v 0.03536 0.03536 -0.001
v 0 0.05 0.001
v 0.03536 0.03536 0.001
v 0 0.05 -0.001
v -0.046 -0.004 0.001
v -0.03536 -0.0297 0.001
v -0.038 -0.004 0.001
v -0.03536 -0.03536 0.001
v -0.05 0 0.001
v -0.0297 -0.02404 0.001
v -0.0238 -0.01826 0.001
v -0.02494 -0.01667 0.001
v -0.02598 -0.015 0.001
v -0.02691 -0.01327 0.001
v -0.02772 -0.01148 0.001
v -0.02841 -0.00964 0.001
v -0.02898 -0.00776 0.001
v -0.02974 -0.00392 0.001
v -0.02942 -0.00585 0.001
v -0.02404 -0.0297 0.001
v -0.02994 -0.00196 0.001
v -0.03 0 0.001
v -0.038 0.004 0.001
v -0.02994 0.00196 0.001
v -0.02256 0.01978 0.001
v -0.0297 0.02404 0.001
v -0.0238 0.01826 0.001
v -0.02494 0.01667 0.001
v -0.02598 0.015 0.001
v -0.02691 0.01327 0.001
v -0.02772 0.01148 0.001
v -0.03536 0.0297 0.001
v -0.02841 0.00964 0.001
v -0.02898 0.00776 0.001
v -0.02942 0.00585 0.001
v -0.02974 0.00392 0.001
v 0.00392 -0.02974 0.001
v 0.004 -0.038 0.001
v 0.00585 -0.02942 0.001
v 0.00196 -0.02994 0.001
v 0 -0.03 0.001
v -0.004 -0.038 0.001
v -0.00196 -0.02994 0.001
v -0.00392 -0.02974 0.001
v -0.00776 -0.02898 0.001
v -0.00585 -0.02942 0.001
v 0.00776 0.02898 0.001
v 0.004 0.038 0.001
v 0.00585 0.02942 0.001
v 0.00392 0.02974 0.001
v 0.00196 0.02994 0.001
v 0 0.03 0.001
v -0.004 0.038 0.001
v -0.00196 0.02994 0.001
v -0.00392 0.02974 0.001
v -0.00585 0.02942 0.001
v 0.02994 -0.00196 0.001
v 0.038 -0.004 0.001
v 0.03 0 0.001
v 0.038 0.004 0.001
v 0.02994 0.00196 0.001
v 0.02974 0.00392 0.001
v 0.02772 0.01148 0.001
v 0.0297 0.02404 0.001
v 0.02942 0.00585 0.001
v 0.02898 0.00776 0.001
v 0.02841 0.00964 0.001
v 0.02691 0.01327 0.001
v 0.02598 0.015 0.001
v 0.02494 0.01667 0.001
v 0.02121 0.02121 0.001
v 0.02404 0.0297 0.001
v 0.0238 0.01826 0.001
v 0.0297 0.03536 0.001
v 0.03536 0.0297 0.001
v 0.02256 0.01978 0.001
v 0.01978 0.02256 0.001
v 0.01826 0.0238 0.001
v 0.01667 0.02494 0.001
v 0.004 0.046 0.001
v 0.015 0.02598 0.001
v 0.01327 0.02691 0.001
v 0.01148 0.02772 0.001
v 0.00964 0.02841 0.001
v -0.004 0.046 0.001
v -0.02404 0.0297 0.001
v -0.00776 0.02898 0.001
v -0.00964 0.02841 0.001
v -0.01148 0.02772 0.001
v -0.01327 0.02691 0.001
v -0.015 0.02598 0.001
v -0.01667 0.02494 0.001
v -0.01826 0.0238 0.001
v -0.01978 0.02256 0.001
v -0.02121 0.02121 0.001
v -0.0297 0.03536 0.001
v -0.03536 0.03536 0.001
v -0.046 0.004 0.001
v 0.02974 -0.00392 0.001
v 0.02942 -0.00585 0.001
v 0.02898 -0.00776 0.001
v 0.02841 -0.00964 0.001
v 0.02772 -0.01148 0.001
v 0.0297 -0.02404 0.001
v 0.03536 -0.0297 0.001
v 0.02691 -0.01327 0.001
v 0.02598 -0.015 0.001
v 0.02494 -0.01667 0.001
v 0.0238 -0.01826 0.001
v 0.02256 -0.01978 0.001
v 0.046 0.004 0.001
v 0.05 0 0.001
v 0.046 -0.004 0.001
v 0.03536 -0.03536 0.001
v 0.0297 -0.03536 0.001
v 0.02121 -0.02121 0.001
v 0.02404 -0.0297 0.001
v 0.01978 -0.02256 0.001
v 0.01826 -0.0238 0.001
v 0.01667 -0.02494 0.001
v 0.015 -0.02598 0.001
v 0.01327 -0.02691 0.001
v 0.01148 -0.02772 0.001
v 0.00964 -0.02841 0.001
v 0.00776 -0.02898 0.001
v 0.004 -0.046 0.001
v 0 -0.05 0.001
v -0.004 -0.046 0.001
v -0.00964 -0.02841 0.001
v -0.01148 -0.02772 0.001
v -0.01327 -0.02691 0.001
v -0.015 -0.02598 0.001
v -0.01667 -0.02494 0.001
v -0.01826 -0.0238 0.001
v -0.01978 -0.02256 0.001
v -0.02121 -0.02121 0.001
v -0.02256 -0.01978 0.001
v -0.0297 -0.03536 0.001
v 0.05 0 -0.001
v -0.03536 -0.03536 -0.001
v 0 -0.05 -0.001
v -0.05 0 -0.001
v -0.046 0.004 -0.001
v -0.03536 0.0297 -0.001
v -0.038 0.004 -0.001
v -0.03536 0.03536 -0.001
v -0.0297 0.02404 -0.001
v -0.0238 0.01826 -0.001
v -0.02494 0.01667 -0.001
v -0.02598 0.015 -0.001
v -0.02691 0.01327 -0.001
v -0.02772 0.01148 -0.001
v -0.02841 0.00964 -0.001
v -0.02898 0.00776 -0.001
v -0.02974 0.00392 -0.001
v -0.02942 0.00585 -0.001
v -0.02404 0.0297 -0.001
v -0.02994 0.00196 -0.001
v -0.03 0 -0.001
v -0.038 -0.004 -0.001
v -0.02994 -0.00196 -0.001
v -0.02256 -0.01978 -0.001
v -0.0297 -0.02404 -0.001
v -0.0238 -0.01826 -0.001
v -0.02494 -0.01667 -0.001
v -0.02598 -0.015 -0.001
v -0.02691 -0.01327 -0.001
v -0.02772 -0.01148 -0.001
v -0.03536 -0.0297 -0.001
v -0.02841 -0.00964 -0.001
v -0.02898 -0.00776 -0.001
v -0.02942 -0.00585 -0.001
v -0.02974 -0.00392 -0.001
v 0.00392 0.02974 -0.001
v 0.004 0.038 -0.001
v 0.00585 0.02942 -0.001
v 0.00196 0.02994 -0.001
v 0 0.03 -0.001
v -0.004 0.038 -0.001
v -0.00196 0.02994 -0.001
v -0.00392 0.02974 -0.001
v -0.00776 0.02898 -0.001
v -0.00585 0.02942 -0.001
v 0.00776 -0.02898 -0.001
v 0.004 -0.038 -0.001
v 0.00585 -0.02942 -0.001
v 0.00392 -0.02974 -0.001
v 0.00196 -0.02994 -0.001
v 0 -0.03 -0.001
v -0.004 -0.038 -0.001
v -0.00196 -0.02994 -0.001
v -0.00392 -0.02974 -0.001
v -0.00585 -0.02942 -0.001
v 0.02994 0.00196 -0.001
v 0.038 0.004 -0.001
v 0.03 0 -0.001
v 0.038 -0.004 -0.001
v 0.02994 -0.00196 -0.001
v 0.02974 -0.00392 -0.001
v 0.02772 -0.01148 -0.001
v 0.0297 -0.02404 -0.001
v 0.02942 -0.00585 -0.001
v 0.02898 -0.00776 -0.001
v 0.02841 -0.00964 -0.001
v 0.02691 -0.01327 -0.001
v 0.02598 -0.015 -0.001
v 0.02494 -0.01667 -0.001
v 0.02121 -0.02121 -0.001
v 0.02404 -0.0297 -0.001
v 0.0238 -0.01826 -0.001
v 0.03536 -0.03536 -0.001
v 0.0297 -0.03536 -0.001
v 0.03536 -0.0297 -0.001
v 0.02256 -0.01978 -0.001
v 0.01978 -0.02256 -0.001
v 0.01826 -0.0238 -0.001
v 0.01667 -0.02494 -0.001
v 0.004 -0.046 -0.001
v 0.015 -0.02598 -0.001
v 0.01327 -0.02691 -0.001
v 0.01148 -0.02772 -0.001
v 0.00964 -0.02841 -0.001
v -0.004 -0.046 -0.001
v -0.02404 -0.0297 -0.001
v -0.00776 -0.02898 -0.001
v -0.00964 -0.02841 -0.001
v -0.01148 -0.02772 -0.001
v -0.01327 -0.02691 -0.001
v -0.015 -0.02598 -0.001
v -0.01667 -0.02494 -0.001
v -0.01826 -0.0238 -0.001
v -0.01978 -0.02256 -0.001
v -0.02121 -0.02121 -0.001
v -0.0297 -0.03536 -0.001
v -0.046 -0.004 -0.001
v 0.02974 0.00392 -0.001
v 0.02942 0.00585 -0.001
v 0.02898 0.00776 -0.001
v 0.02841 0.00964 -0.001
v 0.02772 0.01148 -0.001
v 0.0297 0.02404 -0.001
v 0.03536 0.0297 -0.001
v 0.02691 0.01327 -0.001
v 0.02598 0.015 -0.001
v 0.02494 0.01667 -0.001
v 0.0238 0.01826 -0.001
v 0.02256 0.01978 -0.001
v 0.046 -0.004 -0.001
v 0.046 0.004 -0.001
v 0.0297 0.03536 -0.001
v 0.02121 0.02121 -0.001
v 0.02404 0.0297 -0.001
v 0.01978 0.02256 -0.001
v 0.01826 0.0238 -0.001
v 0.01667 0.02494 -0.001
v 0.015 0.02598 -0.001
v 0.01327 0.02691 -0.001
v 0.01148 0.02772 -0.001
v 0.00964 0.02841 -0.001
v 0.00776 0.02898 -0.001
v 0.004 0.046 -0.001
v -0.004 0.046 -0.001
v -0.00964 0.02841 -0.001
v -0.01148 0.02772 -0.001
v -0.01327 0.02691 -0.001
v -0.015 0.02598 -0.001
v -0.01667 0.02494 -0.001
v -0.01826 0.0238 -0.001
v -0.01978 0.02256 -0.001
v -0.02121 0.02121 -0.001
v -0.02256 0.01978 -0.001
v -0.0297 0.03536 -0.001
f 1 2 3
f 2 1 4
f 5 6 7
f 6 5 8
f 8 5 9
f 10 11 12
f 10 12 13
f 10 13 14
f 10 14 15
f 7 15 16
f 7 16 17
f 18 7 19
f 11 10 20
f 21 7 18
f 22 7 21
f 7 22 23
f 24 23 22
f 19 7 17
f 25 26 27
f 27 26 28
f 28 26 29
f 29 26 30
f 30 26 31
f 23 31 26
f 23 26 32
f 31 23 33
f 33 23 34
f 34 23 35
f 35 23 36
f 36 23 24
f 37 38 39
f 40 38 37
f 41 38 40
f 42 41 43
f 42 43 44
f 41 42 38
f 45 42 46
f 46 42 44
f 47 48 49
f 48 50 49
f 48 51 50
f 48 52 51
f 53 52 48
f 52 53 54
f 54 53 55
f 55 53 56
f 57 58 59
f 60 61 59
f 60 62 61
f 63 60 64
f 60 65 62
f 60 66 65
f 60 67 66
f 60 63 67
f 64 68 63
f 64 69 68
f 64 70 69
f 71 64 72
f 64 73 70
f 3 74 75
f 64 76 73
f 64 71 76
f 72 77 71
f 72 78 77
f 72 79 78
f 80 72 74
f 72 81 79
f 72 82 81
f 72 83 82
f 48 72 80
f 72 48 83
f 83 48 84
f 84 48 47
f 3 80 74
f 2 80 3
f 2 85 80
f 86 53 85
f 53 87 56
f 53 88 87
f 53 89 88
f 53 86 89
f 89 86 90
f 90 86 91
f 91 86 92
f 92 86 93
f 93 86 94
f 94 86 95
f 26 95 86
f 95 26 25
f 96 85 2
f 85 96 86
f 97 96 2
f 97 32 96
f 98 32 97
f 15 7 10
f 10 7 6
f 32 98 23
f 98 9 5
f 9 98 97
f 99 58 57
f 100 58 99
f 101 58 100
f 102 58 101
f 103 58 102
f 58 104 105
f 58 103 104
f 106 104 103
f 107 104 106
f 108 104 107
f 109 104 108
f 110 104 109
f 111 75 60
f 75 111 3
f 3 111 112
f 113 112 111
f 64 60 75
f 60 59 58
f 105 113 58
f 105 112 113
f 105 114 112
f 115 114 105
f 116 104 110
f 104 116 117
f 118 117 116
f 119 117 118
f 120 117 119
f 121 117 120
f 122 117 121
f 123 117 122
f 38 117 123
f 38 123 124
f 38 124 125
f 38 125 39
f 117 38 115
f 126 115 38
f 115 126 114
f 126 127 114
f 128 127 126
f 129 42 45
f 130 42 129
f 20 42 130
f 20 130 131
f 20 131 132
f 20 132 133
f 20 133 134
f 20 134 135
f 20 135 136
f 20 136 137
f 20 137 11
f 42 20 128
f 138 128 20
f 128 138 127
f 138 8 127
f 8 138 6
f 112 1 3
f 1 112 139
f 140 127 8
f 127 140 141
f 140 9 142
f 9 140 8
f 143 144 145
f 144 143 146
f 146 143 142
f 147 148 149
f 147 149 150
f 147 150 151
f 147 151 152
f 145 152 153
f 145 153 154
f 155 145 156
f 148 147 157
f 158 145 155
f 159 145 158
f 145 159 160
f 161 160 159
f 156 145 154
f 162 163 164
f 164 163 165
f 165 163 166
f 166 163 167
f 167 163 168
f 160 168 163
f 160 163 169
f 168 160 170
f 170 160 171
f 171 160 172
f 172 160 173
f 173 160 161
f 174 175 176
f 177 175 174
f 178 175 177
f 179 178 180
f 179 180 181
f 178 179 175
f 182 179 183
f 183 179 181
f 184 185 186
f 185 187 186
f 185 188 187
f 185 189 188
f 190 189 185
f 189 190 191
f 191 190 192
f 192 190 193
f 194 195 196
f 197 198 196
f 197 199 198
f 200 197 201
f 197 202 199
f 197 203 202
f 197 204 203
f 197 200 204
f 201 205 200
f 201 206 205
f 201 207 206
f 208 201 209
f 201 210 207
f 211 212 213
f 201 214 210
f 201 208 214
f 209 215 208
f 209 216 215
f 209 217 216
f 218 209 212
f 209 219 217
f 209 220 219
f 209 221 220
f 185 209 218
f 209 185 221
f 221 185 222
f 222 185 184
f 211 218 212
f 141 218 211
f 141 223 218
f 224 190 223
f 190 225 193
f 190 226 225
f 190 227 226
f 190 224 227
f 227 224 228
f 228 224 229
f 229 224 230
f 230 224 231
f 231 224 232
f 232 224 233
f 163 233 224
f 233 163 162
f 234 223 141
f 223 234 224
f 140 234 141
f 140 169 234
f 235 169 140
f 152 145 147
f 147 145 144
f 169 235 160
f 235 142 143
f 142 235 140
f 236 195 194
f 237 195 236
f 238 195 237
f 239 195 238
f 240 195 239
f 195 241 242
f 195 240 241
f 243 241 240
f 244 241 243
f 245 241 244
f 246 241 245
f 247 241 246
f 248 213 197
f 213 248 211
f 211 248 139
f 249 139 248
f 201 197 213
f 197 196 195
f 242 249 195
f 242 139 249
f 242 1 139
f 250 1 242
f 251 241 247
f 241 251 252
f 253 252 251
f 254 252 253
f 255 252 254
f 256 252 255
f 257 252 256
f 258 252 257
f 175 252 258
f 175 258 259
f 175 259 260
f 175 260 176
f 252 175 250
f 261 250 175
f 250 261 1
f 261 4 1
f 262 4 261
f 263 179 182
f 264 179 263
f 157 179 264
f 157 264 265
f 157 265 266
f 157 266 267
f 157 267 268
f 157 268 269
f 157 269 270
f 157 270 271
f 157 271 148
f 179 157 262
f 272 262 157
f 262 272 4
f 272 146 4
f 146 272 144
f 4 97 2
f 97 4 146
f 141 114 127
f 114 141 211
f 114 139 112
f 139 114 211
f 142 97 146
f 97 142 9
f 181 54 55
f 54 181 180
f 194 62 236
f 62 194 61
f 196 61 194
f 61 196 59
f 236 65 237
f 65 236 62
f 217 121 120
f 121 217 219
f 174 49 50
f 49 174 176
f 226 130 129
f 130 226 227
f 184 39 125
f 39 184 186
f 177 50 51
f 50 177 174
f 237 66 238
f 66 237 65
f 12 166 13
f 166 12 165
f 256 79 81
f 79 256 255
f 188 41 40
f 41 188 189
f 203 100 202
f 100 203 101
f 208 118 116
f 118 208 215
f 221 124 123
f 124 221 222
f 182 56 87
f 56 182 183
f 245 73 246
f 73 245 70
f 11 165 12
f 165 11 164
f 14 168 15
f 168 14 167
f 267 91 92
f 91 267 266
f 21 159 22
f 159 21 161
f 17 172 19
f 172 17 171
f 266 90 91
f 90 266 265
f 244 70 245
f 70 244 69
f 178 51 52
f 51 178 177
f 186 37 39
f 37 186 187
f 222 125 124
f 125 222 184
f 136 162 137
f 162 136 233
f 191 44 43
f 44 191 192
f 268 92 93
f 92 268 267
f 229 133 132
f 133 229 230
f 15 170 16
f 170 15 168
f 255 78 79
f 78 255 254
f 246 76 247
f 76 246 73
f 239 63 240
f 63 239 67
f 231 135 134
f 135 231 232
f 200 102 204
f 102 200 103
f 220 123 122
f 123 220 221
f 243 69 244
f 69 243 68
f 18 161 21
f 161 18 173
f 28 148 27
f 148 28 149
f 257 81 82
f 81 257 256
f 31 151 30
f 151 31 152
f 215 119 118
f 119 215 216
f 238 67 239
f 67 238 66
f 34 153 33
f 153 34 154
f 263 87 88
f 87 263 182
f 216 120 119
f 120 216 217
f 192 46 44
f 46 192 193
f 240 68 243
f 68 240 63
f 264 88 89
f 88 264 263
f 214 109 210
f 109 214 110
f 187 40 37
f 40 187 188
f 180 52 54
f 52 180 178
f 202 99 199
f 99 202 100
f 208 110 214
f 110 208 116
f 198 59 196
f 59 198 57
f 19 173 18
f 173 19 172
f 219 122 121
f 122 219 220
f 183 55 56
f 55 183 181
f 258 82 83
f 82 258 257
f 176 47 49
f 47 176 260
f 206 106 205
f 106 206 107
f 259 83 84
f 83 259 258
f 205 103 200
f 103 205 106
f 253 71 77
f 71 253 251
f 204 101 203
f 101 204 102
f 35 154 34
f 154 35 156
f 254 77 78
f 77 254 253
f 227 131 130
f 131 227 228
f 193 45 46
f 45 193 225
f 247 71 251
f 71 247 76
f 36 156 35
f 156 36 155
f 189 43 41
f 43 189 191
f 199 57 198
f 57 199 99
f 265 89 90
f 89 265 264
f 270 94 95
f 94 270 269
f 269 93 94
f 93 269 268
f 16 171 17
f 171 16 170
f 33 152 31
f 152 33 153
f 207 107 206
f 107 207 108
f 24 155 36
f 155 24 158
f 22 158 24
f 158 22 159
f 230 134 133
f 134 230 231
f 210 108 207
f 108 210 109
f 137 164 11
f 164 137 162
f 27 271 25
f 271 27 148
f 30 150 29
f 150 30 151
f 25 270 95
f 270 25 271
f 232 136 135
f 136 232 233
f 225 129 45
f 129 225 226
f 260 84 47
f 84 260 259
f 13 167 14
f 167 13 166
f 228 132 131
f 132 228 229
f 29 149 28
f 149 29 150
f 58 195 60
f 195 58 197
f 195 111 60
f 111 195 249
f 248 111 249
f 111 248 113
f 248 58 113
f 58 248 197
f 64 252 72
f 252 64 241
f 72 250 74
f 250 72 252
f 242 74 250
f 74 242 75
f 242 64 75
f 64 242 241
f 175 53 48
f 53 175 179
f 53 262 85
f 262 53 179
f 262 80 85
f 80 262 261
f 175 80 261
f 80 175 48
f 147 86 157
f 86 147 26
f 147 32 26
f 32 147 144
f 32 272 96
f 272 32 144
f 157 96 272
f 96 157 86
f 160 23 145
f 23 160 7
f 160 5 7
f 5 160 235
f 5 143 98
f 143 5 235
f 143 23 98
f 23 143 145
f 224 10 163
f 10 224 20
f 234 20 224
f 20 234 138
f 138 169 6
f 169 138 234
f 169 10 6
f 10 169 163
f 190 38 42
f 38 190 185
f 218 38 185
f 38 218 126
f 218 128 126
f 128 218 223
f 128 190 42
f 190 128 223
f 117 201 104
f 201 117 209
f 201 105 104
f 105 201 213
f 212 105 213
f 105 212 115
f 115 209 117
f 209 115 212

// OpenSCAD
$fn=96;

module octagon_prism(flat_d=100, h=2){
    linear_extrude(height=h, center=true)
        circle(d=flat_d, $fn=8);
}

module square_hole(size=8, h=10){
    linear_extrude(height=h, center=true)
        square([size,size], center=true);
}

module ring_body(flat_d=100, inner_d=60, h=2){
    difference(){
        octagon_prism(flat_d=flat_d, h=h);
        cylinder(d=inner_d, h=h+2, center=true, $fn=96);
    }
}

module chamfered_ring(flat_d=100, inner_d=60, h=2, chamfer=0.6){
    union(){
        ring_body(flat_d=flat_d, inner_d=inner_d, h=h);
        translate([0,0,(h/2)-(chamfer/2)])
            difference(){
                octagon_prism(flat_d=flat_d, h=chamfer);
                octagon_prism(flat_d=flat_d-2*chamfer, h=chamfer+0.02);
                cylinder(d=inner_d, h=chamfer+0.2, center=true, $fn=96);
            }
        translate([0,0,-(h/2)+(chamfer/2)])
            difference(){
                octagon_prism(flat_d=flat_d, h=chamfer);
                octagon_prism(flat_d=flat_d-2*chamfer, h=chamfer+0.02);
                cylinder(d=inner_d, h=chamfer+0.2, center=true, $fn=96);
            }
    }
}

module faceted_washer(
    flat_d=100,
    inner_d=60,
    h=2,
    chamfer=0.6,
    hole_size=8,
    hole_radius=42
){
    difference(){
        chamfered_ring(flat_d=flat_d, inner_d=inner_d, h=h, chamfer=chamfer);
        for(i=[0:7]){
            rotate([0,0,i*45])
                translate([hole_radius,0,0])
                    square_hole(size=hole_size, h=h+4);
        }
    }
}

scale([0.001,0.001,0.001])
    faceted_washer(
        flat_d=100,
        inner_d=60,
        h=2,
        chamfer=0.6,
        hole_size=8,
        hole_radius=42
    );
